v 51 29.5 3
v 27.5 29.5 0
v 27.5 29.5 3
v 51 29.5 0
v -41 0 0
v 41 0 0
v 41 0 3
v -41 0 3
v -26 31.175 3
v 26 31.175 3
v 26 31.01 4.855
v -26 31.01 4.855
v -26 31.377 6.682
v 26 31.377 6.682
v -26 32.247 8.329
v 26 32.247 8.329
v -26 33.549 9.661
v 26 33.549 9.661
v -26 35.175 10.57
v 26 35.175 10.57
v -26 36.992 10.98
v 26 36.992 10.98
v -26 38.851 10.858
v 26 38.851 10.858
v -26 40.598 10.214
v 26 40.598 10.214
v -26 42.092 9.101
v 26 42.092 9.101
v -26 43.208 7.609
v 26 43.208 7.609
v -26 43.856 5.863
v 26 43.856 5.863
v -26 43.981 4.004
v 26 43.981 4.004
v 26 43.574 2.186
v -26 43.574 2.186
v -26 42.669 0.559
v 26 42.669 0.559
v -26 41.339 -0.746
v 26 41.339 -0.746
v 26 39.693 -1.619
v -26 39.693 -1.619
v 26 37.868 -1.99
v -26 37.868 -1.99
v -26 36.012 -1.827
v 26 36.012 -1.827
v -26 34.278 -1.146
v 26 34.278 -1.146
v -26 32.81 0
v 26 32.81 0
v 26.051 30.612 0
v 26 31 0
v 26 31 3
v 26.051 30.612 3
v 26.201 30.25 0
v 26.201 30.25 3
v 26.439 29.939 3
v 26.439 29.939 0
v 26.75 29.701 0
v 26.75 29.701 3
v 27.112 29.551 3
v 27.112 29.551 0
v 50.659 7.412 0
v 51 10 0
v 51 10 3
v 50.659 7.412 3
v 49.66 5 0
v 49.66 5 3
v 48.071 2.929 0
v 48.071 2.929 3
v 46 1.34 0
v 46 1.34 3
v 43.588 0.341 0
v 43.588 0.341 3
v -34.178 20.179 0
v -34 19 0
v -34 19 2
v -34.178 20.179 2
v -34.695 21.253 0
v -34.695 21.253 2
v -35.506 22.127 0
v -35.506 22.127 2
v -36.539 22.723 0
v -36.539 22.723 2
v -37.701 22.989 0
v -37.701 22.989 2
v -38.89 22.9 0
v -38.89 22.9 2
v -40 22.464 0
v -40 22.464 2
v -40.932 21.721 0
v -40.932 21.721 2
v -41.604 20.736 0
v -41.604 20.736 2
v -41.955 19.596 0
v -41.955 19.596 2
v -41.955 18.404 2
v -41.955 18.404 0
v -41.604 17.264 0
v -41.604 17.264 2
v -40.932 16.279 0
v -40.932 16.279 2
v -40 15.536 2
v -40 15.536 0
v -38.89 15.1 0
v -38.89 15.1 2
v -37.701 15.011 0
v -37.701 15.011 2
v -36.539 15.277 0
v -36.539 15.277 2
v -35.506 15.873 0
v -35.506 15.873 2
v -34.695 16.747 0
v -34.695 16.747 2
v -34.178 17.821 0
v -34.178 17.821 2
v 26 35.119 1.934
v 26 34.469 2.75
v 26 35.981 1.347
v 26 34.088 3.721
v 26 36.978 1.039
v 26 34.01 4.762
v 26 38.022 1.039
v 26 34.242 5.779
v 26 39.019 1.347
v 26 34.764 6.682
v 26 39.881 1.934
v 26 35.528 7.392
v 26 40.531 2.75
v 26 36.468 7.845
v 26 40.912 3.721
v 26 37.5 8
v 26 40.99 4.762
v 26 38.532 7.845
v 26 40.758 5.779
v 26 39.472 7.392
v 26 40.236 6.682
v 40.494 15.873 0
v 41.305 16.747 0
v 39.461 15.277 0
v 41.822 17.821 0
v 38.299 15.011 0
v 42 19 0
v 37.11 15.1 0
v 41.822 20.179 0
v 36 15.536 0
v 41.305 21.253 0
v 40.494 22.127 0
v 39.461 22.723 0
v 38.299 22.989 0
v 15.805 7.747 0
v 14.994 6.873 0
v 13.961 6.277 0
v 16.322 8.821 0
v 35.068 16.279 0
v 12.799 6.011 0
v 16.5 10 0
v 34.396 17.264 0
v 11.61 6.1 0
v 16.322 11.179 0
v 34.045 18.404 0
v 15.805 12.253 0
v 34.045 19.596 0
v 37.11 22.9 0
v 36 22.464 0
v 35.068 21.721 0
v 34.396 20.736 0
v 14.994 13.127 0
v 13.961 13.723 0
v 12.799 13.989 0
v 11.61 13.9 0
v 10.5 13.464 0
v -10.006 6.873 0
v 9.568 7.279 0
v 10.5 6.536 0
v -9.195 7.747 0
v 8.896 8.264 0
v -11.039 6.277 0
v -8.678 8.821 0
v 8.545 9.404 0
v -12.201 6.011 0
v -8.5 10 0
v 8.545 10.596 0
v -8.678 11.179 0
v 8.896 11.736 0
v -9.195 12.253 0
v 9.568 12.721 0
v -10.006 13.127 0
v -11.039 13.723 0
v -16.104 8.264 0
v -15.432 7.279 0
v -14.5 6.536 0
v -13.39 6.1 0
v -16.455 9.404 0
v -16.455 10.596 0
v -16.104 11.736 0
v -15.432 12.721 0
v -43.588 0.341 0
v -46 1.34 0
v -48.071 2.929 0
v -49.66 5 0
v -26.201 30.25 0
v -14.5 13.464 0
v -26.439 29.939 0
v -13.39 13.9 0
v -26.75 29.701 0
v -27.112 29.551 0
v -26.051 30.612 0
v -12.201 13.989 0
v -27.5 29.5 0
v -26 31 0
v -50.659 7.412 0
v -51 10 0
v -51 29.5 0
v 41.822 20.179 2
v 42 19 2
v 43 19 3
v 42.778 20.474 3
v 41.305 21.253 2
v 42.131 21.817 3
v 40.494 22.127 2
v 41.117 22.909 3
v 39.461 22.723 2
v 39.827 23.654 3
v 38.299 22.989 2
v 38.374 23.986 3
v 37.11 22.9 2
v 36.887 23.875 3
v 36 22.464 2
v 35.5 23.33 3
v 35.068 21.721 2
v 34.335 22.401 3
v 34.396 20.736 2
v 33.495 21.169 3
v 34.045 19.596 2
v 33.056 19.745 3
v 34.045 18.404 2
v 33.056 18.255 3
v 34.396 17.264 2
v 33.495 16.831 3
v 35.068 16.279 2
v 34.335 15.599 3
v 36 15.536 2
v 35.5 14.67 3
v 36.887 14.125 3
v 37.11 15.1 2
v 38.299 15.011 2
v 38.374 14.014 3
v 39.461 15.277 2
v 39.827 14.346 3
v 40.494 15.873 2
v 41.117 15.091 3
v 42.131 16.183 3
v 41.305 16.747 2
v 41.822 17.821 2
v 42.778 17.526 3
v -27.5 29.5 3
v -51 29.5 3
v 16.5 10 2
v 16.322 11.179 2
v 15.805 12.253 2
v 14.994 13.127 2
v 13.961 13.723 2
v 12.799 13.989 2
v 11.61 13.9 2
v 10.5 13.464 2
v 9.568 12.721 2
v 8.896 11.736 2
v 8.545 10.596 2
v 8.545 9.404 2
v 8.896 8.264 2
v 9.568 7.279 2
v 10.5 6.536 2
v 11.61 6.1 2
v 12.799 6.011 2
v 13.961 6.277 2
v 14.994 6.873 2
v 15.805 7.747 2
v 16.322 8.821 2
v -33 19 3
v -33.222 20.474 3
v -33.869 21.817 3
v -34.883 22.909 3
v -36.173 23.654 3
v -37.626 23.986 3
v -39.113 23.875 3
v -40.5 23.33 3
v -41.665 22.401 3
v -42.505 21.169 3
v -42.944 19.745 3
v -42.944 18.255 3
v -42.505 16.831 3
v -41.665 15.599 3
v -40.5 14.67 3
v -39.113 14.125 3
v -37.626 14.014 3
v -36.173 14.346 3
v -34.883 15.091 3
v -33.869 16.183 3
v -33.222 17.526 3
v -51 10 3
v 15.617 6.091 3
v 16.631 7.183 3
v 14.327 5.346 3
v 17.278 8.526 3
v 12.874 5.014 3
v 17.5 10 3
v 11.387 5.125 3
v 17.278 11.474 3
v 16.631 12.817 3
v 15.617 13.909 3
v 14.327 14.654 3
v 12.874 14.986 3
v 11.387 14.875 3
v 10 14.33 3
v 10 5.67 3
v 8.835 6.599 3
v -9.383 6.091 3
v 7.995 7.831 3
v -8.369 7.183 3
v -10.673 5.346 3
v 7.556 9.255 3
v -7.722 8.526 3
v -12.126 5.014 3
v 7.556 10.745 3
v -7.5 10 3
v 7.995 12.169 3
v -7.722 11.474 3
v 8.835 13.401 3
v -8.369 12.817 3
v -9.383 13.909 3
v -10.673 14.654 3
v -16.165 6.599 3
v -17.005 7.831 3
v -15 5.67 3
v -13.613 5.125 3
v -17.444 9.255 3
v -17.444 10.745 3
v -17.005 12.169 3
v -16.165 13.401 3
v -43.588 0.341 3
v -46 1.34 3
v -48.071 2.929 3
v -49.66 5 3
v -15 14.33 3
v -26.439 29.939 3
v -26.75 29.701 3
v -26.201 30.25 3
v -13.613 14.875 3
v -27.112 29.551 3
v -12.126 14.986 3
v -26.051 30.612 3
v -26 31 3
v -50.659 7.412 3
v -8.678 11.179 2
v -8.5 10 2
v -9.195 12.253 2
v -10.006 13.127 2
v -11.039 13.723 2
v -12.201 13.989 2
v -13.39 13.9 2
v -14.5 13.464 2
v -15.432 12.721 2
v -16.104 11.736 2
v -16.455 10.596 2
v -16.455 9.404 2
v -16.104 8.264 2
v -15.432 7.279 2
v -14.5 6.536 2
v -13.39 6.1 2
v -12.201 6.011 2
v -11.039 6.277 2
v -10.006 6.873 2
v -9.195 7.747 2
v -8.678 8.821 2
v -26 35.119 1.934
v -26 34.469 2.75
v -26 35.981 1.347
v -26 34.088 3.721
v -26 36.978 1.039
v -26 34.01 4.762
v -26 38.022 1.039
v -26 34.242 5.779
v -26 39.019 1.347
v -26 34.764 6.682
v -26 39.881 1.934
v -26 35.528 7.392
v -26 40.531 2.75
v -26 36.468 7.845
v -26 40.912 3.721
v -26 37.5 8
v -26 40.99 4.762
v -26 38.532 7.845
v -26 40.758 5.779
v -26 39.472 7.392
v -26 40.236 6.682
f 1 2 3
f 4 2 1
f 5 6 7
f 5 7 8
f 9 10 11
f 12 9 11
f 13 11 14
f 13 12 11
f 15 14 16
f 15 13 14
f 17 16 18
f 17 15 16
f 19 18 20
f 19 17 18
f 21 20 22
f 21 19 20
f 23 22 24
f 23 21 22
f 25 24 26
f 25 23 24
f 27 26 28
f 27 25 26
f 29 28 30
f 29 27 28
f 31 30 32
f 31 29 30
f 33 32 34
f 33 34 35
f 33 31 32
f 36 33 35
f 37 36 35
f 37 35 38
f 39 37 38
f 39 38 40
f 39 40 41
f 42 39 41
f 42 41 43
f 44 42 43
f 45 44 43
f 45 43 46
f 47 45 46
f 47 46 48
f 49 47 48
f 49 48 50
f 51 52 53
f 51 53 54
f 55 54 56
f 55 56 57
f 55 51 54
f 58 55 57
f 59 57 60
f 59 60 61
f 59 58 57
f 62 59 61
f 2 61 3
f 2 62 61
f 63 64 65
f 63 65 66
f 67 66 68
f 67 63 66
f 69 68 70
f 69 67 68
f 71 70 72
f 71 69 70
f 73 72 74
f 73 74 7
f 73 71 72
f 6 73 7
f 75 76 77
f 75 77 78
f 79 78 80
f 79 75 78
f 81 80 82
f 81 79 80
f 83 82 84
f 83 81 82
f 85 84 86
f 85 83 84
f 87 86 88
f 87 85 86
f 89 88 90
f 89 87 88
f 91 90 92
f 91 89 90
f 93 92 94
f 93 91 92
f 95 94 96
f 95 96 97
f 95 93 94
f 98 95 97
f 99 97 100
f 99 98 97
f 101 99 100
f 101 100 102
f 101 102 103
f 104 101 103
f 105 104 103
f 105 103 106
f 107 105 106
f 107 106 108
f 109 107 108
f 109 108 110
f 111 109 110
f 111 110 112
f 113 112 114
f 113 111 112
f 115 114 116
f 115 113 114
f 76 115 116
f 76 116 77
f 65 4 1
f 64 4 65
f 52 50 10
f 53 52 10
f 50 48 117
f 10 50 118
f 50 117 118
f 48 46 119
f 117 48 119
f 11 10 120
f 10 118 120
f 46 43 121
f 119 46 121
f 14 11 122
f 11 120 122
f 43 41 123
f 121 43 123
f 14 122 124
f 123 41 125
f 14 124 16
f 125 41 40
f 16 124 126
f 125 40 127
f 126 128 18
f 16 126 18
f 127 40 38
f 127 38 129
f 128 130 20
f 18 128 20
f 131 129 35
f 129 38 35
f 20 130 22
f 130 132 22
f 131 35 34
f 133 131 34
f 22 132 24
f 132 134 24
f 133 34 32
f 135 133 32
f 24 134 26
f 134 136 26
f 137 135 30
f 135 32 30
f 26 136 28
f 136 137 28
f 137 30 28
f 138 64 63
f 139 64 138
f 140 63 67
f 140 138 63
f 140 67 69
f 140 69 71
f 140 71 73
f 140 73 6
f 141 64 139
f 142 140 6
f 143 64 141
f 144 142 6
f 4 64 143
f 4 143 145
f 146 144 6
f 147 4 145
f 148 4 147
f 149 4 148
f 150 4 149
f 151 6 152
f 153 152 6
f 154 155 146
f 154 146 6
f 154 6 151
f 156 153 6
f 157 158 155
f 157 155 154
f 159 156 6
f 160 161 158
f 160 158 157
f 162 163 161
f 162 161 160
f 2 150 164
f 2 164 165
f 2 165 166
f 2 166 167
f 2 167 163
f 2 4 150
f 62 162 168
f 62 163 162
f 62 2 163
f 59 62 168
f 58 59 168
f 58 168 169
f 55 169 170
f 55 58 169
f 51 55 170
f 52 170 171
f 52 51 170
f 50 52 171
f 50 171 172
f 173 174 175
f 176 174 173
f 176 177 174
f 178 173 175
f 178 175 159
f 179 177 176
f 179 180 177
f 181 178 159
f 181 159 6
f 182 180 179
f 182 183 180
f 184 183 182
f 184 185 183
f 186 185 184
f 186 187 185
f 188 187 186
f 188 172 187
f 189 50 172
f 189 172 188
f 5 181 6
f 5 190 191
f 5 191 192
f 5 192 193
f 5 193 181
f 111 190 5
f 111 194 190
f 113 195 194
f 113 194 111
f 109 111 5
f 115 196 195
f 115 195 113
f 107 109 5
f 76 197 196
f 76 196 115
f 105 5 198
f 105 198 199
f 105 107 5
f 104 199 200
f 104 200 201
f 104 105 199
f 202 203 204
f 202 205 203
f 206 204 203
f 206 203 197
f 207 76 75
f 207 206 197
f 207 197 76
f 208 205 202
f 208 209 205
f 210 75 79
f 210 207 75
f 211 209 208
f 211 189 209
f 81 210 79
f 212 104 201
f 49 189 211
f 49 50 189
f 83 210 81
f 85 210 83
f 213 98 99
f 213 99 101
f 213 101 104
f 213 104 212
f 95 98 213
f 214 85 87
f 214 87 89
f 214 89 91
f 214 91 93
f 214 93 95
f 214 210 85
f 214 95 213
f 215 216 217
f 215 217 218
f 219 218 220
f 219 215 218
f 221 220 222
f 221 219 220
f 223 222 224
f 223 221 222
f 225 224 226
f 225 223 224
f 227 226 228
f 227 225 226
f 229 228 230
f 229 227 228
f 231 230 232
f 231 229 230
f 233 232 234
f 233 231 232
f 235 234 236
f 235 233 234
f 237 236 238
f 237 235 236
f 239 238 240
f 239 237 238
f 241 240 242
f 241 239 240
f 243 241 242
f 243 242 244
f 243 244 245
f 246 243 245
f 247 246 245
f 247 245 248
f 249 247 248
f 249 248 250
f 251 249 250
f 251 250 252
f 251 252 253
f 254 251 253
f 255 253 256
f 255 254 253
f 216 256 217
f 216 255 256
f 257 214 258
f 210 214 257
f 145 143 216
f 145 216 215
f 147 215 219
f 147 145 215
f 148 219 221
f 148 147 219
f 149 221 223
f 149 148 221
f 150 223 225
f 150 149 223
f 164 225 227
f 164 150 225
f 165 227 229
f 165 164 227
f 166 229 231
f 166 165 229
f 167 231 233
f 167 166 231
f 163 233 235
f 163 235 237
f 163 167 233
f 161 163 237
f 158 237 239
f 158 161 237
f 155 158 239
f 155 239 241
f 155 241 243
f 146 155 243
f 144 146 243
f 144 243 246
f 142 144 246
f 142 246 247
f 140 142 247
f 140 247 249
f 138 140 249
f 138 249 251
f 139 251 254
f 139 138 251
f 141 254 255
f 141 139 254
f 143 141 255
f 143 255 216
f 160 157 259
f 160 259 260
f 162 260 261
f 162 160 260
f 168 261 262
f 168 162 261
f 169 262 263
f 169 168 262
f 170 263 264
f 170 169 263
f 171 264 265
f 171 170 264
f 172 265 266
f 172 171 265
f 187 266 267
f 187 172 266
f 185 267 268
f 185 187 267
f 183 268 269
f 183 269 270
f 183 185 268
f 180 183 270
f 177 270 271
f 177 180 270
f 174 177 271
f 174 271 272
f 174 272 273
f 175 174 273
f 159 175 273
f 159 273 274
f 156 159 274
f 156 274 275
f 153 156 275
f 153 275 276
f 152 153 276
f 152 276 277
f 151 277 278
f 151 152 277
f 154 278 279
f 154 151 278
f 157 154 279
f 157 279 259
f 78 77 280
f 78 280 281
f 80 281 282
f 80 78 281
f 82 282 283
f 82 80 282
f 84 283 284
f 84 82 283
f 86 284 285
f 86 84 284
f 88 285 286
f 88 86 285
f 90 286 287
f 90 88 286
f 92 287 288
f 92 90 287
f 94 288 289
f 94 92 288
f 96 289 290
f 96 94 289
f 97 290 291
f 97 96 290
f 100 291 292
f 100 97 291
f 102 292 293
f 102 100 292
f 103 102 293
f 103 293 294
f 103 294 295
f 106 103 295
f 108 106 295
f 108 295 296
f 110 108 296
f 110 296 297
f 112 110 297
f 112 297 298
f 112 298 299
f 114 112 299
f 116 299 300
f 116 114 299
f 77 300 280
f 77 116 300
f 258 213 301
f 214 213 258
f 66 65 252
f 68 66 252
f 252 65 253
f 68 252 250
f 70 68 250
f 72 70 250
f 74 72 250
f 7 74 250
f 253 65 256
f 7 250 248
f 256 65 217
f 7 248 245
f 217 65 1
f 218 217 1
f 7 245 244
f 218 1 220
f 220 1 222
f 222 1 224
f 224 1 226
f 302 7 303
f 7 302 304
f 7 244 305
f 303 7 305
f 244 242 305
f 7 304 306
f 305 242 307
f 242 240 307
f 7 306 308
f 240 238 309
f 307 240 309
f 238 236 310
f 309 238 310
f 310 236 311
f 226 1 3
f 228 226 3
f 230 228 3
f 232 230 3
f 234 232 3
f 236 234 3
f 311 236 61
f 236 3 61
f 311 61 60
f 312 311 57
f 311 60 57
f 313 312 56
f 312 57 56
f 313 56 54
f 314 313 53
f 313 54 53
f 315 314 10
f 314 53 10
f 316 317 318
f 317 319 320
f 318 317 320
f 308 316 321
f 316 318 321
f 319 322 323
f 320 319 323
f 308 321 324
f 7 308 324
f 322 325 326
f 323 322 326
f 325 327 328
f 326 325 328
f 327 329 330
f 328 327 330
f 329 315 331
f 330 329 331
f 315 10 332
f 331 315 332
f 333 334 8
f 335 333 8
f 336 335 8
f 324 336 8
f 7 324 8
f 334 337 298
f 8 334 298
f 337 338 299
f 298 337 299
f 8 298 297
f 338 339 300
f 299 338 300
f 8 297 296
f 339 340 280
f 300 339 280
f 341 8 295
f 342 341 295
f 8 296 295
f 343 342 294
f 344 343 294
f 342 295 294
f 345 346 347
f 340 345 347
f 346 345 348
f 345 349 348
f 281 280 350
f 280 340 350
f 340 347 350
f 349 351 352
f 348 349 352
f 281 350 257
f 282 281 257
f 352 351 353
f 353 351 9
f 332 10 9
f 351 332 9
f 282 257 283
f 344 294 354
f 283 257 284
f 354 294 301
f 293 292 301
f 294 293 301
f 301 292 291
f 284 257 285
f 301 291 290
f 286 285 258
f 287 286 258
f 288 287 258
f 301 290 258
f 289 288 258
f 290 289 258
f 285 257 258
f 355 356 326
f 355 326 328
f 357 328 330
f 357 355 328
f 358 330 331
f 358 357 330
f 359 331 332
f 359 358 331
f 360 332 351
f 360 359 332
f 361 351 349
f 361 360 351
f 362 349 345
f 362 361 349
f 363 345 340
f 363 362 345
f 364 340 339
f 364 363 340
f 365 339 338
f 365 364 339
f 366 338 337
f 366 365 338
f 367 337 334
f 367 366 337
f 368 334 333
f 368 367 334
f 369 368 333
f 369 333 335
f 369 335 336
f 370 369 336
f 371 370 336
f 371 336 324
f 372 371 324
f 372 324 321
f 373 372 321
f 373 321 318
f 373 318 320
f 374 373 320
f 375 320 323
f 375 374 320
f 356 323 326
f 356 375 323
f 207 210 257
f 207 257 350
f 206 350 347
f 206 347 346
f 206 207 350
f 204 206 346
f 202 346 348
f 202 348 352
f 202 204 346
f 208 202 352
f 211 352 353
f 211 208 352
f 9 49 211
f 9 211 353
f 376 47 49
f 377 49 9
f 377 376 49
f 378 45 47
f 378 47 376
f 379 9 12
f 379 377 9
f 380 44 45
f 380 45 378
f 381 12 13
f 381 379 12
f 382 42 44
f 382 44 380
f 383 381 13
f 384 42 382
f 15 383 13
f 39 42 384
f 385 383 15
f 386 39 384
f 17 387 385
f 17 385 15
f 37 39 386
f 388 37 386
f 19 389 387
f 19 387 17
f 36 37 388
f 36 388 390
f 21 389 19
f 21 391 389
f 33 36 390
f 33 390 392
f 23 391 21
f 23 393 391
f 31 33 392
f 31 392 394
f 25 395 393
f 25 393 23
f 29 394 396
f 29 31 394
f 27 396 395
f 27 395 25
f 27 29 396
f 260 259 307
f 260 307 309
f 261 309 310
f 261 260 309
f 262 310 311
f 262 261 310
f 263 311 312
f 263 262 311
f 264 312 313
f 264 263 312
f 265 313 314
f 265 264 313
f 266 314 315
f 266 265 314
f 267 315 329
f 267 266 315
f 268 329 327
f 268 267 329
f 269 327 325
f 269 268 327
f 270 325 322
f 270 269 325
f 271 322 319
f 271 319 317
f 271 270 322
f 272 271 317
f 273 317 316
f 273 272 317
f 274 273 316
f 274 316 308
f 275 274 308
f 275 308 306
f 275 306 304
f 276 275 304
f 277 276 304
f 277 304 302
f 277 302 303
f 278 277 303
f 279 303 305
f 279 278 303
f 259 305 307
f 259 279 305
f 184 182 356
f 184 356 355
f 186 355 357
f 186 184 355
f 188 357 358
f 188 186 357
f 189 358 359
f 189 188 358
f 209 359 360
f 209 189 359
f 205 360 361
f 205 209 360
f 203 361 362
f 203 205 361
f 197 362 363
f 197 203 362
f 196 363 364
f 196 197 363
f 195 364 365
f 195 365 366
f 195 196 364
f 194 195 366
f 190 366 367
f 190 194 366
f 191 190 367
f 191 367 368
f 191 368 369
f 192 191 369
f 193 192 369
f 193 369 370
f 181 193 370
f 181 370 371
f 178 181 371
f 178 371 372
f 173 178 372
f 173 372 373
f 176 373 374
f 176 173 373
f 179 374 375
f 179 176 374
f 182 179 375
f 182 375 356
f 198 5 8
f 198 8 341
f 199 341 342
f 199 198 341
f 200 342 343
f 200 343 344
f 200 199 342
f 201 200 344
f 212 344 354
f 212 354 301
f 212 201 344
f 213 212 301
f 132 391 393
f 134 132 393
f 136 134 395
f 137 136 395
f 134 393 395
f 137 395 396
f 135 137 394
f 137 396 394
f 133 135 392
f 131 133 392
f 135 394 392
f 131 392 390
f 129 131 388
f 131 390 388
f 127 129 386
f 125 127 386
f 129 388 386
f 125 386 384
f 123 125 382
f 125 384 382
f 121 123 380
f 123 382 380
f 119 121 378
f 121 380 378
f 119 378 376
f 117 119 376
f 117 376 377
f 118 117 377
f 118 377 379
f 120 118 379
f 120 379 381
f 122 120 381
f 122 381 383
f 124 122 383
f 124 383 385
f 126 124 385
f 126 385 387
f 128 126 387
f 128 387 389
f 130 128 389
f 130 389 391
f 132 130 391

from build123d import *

# Parameters (mm, degrees)
SKETCH1_R           = 4
BOSS_EXTRUDE1_DEPTH = 3
SKETCH2_R           = 6.5
BOSS_EXTRUDE2_DEPTH = 52
SKETCH3_R           = 3.5
CUT_EXTRUDE1_DEPTH  = 90.364422451
CHAMFER1_SIZE       = 1


with BuildPart() as part:
    # Sketch1 → Boss-Extrude1 (new body)
    with BuildSketch(Plane.XY):
        with BuildLine():
            Line((27.5, 29.5), (51, 29.5))
            Line((51, 29.5), (51, 10))
            ThreePointArc((51, 10), (48.071067812, 2.928932188), (41, 0))
            Line((41, 0), (-41, 0))
            ThreePointArc((-41, 0), (-48.071067812, 2.928932188), (-51, 10))
            Line((-51, 10), (-51, 29.5))
            Line((-51, 29.5), (-27.5, 29.5))
            ThreePointArc((-27.5, 29.5), (-26.439339828, 29.939339828), (-26, 31))
            Line((-26, 31), (-26, 37.5))
            Line((-26, 37.5), (26, 37.5))
            Line((26, 37.5), (26, 31))
            ThreePointArc((26, 31), (26.439339828, 29.939339828), (27.5, 29.5))
        make_face()
        with Locations((-38, 19)):
            Circle(SKETCH1_R, mode=Mode.SUBTRACT)
        with Locations((38, 19)):
            Circle(SKETCH1_R, mode=Mode.SUBTRACT)
        with Locations((-12.5, 10)):
            Circle(SKETCH1_R, mode=Mode.SUBTRACT)
        with Locations((12.5, 10)):
            Circle(SKETCH1_R, mode=Mode.SUBTRACT)
    extrude(amount=BOSS_EXTRUDE1_DEPTH)

    # Sketch2 → Boss-Extrude2 (add)
    with BuildSketch(Plane.ZY.offset(26)):
        with Locations((4.5, 37.5)):
            Circle(SKETCH2_R)
    extrude(amount=-BOSS_EXTRUDE2_DEPTH)

    # Sketch3 → Cut-Extrude1 (cut, through all)
    with BuildSketch(Plane.ZY.offset(26)):
        with Locations((4.5, 37.5)):
            Circle(SKETCH3_R)
    extrude(amount=-CUT_EXTRUDE1_DEPTH, mode=Mode.SUBTRACT)

    # Chamfer1
    chamfer1_edges = [part.edges().sort_by_distance(p)[0] for p in [
        (-42, 19, 3),
        (34, 19, 3),
        (-16.5, 10, 3),
        (8.5, 10, 3),
    ]]
    chamfer(chamfer1_edges, length=CHAMFER1_SIZE)


solid = part.part
